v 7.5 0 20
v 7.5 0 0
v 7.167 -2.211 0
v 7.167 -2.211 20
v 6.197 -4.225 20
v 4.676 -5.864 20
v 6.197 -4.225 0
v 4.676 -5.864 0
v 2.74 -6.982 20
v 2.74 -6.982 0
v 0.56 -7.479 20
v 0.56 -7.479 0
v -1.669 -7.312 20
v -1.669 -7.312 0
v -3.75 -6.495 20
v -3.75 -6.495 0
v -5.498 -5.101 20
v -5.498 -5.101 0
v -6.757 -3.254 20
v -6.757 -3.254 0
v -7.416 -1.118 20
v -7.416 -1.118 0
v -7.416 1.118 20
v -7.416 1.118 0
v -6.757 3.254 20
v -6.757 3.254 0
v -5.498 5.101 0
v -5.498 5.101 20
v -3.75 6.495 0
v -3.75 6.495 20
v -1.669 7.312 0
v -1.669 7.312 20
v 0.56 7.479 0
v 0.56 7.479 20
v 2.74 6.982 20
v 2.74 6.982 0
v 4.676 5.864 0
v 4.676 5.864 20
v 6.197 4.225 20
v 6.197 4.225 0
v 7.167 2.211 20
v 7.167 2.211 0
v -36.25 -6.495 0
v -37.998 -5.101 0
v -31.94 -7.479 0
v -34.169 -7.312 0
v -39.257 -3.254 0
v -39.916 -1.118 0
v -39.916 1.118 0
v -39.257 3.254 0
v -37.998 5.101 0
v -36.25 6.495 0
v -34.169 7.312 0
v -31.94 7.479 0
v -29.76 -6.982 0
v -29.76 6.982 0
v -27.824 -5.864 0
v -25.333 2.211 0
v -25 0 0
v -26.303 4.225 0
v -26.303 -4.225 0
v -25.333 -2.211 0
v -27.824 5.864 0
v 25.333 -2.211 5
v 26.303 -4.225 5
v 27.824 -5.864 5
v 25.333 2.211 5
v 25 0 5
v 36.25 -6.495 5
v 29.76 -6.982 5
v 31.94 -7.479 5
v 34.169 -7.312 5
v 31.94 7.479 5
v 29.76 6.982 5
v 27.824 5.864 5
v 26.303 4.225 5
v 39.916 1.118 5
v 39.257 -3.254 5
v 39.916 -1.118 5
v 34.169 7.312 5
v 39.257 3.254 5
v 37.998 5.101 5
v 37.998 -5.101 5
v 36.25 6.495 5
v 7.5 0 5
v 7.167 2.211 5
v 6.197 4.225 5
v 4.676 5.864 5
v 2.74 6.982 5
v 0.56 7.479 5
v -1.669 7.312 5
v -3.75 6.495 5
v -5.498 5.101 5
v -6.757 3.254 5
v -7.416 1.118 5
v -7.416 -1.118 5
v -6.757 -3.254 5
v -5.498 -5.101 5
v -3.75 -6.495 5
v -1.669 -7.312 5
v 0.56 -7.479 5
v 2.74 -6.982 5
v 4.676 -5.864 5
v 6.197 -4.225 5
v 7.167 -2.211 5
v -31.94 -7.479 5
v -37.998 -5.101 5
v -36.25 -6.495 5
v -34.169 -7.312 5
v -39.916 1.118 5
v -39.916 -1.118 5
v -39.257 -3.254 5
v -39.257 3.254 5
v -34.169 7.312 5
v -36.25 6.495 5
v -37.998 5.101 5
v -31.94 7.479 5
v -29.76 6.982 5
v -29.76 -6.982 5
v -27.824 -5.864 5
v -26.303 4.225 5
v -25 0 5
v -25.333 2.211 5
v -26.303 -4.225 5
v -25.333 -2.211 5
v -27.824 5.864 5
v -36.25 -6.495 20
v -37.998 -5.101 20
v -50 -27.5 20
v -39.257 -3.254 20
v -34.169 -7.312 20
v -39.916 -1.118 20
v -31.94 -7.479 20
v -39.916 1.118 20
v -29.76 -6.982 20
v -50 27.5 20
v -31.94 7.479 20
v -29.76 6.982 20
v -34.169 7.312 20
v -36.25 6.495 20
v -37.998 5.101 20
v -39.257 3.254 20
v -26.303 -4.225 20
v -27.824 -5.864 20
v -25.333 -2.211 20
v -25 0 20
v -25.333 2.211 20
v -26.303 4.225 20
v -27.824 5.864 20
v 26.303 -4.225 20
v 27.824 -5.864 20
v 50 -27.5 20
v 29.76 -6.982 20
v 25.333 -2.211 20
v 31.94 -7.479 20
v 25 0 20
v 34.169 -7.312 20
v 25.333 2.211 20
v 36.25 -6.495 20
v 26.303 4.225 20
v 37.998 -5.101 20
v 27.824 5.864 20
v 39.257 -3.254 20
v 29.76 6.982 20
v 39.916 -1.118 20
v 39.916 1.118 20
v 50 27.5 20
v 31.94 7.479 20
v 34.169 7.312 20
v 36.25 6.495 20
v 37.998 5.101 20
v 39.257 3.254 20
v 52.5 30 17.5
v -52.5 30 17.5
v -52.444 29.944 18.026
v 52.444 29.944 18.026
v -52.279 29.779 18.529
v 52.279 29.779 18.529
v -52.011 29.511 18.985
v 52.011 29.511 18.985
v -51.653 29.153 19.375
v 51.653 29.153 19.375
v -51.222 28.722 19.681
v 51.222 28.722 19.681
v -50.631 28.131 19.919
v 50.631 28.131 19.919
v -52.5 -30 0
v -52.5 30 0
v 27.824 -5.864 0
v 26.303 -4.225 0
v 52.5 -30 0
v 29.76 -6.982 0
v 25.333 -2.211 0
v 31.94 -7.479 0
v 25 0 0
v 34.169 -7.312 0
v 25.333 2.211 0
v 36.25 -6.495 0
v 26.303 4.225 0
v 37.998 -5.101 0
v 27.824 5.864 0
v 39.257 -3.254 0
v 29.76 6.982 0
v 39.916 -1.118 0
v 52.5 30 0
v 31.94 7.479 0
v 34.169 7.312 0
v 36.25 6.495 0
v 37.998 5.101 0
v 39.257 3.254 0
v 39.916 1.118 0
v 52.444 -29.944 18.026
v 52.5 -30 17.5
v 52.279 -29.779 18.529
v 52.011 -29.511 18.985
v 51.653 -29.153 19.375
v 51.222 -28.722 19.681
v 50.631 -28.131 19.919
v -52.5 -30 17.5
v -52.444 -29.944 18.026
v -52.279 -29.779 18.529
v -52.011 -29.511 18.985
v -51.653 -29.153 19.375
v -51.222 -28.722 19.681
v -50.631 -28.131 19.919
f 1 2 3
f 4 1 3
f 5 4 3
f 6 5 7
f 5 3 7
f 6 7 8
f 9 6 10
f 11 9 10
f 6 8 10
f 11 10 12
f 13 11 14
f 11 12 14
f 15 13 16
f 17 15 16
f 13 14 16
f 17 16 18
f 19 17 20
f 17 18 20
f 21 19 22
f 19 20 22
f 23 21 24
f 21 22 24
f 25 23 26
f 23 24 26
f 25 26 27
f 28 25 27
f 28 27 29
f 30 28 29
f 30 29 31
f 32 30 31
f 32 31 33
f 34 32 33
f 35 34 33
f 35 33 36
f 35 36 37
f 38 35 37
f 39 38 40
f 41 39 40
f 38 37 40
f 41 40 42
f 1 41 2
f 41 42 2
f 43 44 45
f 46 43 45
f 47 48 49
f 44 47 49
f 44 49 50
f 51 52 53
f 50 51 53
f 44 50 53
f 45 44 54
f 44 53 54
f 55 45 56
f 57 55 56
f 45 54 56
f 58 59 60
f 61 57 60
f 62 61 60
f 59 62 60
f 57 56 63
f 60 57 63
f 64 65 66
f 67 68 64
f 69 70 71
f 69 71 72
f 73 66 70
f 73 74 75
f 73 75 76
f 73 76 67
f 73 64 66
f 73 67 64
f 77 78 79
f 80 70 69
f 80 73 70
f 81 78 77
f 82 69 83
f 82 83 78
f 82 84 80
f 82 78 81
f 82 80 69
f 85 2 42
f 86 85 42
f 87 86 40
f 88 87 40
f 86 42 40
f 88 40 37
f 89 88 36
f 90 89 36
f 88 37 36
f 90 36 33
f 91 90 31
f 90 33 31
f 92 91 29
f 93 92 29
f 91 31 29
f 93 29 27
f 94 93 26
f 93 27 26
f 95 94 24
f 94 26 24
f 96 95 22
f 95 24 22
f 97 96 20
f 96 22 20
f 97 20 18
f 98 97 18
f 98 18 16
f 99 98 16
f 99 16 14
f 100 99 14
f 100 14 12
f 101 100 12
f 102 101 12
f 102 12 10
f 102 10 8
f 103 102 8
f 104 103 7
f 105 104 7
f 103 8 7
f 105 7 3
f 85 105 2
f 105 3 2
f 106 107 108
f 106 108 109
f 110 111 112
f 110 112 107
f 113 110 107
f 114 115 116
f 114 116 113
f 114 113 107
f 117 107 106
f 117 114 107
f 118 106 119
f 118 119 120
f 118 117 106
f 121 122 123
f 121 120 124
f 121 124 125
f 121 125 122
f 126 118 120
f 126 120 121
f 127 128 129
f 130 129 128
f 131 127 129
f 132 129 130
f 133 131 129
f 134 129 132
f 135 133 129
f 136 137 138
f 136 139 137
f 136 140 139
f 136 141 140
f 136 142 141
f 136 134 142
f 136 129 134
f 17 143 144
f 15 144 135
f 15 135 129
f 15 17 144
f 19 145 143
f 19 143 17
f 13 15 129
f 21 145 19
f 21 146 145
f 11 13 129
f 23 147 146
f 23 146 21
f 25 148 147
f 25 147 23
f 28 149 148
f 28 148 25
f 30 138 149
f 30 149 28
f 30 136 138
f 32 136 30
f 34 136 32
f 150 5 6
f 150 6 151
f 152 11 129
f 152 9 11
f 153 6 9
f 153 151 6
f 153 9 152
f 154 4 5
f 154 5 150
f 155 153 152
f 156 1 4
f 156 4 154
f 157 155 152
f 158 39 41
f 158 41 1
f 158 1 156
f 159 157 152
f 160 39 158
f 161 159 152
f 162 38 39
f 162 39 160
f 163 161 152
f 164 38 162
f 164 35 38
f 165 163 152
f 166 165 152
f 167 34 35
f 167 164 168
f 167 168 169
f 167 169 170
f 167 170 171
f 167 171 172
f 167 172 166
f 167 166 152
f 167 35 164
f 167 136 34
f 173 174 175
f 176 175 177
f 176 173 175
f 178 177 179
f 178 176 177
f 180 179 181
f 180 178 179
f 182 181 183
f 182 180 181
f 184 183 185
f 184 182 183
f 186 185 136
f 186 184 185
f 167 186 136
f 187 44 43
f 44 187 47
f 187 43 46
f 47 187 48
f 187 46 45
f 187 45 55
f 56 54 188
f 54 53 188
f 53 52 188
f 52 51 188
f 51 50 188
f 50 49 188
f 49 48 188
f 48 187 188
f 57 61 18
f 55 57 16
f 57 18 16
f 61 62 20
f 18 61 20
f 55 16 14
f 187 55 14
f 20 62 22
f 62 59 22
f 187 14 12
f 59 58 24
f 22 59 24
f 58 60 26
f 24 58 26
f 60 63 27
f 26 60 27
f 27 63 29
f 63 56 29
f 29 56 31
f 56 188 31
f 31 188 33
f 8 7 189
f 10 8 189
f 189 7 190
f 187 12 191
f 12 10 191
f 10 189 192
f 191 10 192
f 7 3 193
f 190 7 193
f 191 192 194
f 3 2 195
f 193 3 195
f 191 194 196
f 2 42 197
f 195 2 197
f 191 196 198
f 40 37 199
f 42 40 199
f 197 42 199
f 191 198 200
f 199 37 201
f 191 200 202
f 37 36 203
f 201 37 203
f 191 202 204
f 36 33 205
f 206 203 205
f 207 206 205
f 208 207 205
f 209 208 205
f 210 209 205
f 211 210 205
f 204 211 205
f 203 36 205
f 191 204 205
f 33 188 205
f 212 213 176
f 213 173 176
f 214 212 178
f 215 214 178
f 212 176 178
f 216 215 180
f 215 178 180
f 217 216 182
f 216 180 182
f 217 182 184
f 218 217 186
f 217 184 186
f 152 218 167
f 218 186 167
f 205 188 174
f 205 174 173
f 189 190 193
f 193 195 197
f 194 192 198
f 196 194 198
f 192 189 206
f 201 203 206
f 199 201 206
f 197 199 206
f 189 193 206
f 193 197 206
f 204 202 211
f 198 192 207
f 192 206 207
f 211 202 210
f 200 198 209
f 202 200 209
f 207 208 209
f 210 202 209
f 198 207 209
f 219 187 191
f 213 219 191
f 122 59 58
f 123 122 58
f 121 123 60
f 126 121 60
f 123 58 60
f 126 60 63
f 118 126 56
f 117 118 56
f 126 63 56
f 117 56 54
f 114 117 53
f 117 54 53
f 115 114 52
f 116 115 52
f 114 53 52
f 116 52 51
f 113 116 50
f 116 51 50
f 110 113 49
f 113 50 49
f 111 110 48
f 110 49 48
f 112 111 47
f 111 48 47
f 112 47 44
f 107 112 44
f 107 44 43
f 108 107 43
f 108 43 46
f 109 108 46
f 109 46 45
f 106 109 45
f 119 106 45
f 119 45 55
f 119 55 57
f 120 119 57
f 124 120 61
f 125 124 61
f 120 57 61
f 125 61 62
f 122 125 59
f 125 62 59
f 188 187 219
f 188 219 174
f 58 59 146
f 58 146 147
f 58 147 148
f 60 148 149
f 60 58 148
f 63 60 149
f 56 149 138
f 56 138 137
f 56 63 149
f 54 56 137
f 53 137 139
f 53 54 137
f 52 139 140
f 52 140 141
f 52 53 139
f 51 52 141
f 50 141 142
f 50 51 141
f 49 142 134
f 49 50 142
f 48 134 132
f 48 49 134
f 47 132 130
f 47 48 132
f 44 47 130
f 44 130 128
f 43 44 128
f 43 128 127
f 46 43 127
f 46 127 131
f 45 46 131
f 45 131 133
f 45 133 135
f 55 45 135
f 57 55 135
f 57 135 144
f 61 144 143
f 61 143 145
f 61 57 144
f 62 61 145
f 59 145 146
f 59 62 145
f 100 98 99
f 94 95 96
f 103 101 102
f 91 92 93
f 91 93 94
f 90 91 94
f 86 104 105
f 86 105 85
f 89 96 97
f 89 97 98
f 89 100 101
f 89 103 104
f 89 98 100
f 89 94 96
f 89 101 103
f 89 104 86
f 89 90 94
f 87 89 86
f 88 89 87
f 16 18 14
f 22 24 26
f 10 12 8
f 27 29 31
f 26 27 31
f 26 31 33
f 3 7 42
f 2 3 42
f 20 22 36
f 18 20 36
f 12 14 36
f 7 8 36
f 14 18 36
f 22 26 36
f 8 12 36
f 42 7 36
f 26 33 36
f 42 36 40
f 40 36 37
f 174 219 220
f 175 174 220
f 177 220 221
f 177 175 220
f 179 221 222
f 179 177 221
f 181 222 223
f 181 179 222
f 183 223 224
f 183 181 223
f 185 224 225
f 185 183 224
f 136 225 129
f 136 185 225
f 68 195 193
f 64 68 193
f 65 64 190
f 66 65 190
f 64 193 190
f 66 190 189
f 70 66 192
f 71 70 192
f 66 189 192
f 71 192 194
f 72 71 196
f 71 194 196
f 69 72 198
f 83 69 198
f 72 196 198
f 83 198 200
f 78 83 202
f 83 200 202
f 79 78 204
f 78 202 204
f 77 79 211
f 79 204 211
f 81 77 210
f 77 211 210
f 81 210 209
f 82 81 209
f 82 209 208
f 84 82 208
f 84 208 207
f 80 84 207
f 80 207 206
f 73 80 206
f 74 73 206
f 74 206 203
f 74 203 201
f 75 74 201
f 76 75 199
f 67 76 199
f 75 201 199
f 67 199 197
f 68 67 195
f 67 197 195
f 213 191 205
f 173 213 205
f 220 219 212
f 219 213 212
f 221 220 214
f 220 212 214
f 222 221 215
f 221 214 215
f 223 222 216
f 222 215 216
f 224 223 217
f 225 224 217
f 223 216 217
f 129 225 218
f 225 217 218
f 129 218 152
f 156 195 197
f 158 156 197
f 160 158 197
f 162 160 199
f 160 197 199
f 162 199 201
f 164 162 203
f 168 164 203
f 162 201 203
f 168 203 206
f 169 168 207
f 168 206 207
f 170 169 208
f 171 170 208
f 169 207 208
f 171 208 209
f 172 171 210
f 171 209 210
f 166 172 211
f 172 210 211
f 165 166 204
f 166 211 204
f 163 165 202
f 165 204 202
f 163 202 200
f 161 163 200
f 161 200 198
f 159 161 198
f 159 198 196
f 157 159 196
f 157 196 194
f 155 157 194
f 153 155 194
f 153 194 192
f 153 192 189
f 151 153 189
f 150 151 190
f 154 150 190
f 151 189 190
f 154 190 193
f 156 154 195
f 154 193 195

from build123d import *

# Parameters (mm, degrees)
F0_W     = 105
F0_H     = 60
F0_R     = 7.5
F1_DEPTH = 20
F2_DEPTH = 5
F3_R     = 2.5


with BuildPart() as f1:
    # F0 (on Top) → F1 (new body)
    with BuildSketch(Plane.XY):
        Rectangle(F0_W, F0_H)
        with Locations((-32.5, 0)):
            Circle(F0_R, mode=Mode.SUBTRACT)
        with BuildLine():
            ThreePointArc((-7.5, 0), (0, 7.5), (7.5, 0))
            ThreePointArc((7.5, 0), (0, -7.5), (-7.5, 0))
        make_face(mode=Mode.SUBTRACT)
        with BuildLine():
            ThreePointArc((40, 0), (32.5, -7.5), (25, 0))
            ThreePointArc((25, 0), (32.5, 7.5), (40, 0))
        make_face(mode=Mode.SUBTRACT)
    extrude(amount=F1_DEPTH)

    # F3
    f3_edges = [f1.edges().sort_by_distance(p)[0] for p in [
        (0, -30, 20),
        (-52.5, 0, 20),
        (0, 30, 20),
        (52.5, 0, 20),
    ]]
    fillet(f3_edges, radius=F3_R)


with BuildPart() as f2:
    # F0 (on Top) → F2 (new body)
    with BuildSketch(Plane.XY):
        with BuildLine():
            ThreePointArc((-7.5, 0), (0, -7.5), (7.5, 0))
            ThreePointArc((7.5, 0), (0, 7.5), (-7.5, 0))
        make_face()
    extrude(amount=F2_DEPTH)


with BuildPart() as f2b:
    # F0 (on Top) → F2, piece 2 (new body)
    with BuildSketch(Plane.XY):
        with Locations((-32.5, 0)):
            Circle(F0_R)
    extrude(amount=F2_DEPTH)


with BuildPart() as f2c:
    # F0 (on Top) → F2, piece 3 (new body)
    with BuildSketch(Plane.XY):
        with BuildLine():
            ThreePointArc((40, 0), (32.5, 7.5), (25, 0))
            ThreePointArc((25, 0), (32.5, -7.5), (40, 0))
        make_face()
    extrude(amount=F2_DEPTH)


solid = Compound([f1.part, f2.part, f2b.part, f2c.part])
